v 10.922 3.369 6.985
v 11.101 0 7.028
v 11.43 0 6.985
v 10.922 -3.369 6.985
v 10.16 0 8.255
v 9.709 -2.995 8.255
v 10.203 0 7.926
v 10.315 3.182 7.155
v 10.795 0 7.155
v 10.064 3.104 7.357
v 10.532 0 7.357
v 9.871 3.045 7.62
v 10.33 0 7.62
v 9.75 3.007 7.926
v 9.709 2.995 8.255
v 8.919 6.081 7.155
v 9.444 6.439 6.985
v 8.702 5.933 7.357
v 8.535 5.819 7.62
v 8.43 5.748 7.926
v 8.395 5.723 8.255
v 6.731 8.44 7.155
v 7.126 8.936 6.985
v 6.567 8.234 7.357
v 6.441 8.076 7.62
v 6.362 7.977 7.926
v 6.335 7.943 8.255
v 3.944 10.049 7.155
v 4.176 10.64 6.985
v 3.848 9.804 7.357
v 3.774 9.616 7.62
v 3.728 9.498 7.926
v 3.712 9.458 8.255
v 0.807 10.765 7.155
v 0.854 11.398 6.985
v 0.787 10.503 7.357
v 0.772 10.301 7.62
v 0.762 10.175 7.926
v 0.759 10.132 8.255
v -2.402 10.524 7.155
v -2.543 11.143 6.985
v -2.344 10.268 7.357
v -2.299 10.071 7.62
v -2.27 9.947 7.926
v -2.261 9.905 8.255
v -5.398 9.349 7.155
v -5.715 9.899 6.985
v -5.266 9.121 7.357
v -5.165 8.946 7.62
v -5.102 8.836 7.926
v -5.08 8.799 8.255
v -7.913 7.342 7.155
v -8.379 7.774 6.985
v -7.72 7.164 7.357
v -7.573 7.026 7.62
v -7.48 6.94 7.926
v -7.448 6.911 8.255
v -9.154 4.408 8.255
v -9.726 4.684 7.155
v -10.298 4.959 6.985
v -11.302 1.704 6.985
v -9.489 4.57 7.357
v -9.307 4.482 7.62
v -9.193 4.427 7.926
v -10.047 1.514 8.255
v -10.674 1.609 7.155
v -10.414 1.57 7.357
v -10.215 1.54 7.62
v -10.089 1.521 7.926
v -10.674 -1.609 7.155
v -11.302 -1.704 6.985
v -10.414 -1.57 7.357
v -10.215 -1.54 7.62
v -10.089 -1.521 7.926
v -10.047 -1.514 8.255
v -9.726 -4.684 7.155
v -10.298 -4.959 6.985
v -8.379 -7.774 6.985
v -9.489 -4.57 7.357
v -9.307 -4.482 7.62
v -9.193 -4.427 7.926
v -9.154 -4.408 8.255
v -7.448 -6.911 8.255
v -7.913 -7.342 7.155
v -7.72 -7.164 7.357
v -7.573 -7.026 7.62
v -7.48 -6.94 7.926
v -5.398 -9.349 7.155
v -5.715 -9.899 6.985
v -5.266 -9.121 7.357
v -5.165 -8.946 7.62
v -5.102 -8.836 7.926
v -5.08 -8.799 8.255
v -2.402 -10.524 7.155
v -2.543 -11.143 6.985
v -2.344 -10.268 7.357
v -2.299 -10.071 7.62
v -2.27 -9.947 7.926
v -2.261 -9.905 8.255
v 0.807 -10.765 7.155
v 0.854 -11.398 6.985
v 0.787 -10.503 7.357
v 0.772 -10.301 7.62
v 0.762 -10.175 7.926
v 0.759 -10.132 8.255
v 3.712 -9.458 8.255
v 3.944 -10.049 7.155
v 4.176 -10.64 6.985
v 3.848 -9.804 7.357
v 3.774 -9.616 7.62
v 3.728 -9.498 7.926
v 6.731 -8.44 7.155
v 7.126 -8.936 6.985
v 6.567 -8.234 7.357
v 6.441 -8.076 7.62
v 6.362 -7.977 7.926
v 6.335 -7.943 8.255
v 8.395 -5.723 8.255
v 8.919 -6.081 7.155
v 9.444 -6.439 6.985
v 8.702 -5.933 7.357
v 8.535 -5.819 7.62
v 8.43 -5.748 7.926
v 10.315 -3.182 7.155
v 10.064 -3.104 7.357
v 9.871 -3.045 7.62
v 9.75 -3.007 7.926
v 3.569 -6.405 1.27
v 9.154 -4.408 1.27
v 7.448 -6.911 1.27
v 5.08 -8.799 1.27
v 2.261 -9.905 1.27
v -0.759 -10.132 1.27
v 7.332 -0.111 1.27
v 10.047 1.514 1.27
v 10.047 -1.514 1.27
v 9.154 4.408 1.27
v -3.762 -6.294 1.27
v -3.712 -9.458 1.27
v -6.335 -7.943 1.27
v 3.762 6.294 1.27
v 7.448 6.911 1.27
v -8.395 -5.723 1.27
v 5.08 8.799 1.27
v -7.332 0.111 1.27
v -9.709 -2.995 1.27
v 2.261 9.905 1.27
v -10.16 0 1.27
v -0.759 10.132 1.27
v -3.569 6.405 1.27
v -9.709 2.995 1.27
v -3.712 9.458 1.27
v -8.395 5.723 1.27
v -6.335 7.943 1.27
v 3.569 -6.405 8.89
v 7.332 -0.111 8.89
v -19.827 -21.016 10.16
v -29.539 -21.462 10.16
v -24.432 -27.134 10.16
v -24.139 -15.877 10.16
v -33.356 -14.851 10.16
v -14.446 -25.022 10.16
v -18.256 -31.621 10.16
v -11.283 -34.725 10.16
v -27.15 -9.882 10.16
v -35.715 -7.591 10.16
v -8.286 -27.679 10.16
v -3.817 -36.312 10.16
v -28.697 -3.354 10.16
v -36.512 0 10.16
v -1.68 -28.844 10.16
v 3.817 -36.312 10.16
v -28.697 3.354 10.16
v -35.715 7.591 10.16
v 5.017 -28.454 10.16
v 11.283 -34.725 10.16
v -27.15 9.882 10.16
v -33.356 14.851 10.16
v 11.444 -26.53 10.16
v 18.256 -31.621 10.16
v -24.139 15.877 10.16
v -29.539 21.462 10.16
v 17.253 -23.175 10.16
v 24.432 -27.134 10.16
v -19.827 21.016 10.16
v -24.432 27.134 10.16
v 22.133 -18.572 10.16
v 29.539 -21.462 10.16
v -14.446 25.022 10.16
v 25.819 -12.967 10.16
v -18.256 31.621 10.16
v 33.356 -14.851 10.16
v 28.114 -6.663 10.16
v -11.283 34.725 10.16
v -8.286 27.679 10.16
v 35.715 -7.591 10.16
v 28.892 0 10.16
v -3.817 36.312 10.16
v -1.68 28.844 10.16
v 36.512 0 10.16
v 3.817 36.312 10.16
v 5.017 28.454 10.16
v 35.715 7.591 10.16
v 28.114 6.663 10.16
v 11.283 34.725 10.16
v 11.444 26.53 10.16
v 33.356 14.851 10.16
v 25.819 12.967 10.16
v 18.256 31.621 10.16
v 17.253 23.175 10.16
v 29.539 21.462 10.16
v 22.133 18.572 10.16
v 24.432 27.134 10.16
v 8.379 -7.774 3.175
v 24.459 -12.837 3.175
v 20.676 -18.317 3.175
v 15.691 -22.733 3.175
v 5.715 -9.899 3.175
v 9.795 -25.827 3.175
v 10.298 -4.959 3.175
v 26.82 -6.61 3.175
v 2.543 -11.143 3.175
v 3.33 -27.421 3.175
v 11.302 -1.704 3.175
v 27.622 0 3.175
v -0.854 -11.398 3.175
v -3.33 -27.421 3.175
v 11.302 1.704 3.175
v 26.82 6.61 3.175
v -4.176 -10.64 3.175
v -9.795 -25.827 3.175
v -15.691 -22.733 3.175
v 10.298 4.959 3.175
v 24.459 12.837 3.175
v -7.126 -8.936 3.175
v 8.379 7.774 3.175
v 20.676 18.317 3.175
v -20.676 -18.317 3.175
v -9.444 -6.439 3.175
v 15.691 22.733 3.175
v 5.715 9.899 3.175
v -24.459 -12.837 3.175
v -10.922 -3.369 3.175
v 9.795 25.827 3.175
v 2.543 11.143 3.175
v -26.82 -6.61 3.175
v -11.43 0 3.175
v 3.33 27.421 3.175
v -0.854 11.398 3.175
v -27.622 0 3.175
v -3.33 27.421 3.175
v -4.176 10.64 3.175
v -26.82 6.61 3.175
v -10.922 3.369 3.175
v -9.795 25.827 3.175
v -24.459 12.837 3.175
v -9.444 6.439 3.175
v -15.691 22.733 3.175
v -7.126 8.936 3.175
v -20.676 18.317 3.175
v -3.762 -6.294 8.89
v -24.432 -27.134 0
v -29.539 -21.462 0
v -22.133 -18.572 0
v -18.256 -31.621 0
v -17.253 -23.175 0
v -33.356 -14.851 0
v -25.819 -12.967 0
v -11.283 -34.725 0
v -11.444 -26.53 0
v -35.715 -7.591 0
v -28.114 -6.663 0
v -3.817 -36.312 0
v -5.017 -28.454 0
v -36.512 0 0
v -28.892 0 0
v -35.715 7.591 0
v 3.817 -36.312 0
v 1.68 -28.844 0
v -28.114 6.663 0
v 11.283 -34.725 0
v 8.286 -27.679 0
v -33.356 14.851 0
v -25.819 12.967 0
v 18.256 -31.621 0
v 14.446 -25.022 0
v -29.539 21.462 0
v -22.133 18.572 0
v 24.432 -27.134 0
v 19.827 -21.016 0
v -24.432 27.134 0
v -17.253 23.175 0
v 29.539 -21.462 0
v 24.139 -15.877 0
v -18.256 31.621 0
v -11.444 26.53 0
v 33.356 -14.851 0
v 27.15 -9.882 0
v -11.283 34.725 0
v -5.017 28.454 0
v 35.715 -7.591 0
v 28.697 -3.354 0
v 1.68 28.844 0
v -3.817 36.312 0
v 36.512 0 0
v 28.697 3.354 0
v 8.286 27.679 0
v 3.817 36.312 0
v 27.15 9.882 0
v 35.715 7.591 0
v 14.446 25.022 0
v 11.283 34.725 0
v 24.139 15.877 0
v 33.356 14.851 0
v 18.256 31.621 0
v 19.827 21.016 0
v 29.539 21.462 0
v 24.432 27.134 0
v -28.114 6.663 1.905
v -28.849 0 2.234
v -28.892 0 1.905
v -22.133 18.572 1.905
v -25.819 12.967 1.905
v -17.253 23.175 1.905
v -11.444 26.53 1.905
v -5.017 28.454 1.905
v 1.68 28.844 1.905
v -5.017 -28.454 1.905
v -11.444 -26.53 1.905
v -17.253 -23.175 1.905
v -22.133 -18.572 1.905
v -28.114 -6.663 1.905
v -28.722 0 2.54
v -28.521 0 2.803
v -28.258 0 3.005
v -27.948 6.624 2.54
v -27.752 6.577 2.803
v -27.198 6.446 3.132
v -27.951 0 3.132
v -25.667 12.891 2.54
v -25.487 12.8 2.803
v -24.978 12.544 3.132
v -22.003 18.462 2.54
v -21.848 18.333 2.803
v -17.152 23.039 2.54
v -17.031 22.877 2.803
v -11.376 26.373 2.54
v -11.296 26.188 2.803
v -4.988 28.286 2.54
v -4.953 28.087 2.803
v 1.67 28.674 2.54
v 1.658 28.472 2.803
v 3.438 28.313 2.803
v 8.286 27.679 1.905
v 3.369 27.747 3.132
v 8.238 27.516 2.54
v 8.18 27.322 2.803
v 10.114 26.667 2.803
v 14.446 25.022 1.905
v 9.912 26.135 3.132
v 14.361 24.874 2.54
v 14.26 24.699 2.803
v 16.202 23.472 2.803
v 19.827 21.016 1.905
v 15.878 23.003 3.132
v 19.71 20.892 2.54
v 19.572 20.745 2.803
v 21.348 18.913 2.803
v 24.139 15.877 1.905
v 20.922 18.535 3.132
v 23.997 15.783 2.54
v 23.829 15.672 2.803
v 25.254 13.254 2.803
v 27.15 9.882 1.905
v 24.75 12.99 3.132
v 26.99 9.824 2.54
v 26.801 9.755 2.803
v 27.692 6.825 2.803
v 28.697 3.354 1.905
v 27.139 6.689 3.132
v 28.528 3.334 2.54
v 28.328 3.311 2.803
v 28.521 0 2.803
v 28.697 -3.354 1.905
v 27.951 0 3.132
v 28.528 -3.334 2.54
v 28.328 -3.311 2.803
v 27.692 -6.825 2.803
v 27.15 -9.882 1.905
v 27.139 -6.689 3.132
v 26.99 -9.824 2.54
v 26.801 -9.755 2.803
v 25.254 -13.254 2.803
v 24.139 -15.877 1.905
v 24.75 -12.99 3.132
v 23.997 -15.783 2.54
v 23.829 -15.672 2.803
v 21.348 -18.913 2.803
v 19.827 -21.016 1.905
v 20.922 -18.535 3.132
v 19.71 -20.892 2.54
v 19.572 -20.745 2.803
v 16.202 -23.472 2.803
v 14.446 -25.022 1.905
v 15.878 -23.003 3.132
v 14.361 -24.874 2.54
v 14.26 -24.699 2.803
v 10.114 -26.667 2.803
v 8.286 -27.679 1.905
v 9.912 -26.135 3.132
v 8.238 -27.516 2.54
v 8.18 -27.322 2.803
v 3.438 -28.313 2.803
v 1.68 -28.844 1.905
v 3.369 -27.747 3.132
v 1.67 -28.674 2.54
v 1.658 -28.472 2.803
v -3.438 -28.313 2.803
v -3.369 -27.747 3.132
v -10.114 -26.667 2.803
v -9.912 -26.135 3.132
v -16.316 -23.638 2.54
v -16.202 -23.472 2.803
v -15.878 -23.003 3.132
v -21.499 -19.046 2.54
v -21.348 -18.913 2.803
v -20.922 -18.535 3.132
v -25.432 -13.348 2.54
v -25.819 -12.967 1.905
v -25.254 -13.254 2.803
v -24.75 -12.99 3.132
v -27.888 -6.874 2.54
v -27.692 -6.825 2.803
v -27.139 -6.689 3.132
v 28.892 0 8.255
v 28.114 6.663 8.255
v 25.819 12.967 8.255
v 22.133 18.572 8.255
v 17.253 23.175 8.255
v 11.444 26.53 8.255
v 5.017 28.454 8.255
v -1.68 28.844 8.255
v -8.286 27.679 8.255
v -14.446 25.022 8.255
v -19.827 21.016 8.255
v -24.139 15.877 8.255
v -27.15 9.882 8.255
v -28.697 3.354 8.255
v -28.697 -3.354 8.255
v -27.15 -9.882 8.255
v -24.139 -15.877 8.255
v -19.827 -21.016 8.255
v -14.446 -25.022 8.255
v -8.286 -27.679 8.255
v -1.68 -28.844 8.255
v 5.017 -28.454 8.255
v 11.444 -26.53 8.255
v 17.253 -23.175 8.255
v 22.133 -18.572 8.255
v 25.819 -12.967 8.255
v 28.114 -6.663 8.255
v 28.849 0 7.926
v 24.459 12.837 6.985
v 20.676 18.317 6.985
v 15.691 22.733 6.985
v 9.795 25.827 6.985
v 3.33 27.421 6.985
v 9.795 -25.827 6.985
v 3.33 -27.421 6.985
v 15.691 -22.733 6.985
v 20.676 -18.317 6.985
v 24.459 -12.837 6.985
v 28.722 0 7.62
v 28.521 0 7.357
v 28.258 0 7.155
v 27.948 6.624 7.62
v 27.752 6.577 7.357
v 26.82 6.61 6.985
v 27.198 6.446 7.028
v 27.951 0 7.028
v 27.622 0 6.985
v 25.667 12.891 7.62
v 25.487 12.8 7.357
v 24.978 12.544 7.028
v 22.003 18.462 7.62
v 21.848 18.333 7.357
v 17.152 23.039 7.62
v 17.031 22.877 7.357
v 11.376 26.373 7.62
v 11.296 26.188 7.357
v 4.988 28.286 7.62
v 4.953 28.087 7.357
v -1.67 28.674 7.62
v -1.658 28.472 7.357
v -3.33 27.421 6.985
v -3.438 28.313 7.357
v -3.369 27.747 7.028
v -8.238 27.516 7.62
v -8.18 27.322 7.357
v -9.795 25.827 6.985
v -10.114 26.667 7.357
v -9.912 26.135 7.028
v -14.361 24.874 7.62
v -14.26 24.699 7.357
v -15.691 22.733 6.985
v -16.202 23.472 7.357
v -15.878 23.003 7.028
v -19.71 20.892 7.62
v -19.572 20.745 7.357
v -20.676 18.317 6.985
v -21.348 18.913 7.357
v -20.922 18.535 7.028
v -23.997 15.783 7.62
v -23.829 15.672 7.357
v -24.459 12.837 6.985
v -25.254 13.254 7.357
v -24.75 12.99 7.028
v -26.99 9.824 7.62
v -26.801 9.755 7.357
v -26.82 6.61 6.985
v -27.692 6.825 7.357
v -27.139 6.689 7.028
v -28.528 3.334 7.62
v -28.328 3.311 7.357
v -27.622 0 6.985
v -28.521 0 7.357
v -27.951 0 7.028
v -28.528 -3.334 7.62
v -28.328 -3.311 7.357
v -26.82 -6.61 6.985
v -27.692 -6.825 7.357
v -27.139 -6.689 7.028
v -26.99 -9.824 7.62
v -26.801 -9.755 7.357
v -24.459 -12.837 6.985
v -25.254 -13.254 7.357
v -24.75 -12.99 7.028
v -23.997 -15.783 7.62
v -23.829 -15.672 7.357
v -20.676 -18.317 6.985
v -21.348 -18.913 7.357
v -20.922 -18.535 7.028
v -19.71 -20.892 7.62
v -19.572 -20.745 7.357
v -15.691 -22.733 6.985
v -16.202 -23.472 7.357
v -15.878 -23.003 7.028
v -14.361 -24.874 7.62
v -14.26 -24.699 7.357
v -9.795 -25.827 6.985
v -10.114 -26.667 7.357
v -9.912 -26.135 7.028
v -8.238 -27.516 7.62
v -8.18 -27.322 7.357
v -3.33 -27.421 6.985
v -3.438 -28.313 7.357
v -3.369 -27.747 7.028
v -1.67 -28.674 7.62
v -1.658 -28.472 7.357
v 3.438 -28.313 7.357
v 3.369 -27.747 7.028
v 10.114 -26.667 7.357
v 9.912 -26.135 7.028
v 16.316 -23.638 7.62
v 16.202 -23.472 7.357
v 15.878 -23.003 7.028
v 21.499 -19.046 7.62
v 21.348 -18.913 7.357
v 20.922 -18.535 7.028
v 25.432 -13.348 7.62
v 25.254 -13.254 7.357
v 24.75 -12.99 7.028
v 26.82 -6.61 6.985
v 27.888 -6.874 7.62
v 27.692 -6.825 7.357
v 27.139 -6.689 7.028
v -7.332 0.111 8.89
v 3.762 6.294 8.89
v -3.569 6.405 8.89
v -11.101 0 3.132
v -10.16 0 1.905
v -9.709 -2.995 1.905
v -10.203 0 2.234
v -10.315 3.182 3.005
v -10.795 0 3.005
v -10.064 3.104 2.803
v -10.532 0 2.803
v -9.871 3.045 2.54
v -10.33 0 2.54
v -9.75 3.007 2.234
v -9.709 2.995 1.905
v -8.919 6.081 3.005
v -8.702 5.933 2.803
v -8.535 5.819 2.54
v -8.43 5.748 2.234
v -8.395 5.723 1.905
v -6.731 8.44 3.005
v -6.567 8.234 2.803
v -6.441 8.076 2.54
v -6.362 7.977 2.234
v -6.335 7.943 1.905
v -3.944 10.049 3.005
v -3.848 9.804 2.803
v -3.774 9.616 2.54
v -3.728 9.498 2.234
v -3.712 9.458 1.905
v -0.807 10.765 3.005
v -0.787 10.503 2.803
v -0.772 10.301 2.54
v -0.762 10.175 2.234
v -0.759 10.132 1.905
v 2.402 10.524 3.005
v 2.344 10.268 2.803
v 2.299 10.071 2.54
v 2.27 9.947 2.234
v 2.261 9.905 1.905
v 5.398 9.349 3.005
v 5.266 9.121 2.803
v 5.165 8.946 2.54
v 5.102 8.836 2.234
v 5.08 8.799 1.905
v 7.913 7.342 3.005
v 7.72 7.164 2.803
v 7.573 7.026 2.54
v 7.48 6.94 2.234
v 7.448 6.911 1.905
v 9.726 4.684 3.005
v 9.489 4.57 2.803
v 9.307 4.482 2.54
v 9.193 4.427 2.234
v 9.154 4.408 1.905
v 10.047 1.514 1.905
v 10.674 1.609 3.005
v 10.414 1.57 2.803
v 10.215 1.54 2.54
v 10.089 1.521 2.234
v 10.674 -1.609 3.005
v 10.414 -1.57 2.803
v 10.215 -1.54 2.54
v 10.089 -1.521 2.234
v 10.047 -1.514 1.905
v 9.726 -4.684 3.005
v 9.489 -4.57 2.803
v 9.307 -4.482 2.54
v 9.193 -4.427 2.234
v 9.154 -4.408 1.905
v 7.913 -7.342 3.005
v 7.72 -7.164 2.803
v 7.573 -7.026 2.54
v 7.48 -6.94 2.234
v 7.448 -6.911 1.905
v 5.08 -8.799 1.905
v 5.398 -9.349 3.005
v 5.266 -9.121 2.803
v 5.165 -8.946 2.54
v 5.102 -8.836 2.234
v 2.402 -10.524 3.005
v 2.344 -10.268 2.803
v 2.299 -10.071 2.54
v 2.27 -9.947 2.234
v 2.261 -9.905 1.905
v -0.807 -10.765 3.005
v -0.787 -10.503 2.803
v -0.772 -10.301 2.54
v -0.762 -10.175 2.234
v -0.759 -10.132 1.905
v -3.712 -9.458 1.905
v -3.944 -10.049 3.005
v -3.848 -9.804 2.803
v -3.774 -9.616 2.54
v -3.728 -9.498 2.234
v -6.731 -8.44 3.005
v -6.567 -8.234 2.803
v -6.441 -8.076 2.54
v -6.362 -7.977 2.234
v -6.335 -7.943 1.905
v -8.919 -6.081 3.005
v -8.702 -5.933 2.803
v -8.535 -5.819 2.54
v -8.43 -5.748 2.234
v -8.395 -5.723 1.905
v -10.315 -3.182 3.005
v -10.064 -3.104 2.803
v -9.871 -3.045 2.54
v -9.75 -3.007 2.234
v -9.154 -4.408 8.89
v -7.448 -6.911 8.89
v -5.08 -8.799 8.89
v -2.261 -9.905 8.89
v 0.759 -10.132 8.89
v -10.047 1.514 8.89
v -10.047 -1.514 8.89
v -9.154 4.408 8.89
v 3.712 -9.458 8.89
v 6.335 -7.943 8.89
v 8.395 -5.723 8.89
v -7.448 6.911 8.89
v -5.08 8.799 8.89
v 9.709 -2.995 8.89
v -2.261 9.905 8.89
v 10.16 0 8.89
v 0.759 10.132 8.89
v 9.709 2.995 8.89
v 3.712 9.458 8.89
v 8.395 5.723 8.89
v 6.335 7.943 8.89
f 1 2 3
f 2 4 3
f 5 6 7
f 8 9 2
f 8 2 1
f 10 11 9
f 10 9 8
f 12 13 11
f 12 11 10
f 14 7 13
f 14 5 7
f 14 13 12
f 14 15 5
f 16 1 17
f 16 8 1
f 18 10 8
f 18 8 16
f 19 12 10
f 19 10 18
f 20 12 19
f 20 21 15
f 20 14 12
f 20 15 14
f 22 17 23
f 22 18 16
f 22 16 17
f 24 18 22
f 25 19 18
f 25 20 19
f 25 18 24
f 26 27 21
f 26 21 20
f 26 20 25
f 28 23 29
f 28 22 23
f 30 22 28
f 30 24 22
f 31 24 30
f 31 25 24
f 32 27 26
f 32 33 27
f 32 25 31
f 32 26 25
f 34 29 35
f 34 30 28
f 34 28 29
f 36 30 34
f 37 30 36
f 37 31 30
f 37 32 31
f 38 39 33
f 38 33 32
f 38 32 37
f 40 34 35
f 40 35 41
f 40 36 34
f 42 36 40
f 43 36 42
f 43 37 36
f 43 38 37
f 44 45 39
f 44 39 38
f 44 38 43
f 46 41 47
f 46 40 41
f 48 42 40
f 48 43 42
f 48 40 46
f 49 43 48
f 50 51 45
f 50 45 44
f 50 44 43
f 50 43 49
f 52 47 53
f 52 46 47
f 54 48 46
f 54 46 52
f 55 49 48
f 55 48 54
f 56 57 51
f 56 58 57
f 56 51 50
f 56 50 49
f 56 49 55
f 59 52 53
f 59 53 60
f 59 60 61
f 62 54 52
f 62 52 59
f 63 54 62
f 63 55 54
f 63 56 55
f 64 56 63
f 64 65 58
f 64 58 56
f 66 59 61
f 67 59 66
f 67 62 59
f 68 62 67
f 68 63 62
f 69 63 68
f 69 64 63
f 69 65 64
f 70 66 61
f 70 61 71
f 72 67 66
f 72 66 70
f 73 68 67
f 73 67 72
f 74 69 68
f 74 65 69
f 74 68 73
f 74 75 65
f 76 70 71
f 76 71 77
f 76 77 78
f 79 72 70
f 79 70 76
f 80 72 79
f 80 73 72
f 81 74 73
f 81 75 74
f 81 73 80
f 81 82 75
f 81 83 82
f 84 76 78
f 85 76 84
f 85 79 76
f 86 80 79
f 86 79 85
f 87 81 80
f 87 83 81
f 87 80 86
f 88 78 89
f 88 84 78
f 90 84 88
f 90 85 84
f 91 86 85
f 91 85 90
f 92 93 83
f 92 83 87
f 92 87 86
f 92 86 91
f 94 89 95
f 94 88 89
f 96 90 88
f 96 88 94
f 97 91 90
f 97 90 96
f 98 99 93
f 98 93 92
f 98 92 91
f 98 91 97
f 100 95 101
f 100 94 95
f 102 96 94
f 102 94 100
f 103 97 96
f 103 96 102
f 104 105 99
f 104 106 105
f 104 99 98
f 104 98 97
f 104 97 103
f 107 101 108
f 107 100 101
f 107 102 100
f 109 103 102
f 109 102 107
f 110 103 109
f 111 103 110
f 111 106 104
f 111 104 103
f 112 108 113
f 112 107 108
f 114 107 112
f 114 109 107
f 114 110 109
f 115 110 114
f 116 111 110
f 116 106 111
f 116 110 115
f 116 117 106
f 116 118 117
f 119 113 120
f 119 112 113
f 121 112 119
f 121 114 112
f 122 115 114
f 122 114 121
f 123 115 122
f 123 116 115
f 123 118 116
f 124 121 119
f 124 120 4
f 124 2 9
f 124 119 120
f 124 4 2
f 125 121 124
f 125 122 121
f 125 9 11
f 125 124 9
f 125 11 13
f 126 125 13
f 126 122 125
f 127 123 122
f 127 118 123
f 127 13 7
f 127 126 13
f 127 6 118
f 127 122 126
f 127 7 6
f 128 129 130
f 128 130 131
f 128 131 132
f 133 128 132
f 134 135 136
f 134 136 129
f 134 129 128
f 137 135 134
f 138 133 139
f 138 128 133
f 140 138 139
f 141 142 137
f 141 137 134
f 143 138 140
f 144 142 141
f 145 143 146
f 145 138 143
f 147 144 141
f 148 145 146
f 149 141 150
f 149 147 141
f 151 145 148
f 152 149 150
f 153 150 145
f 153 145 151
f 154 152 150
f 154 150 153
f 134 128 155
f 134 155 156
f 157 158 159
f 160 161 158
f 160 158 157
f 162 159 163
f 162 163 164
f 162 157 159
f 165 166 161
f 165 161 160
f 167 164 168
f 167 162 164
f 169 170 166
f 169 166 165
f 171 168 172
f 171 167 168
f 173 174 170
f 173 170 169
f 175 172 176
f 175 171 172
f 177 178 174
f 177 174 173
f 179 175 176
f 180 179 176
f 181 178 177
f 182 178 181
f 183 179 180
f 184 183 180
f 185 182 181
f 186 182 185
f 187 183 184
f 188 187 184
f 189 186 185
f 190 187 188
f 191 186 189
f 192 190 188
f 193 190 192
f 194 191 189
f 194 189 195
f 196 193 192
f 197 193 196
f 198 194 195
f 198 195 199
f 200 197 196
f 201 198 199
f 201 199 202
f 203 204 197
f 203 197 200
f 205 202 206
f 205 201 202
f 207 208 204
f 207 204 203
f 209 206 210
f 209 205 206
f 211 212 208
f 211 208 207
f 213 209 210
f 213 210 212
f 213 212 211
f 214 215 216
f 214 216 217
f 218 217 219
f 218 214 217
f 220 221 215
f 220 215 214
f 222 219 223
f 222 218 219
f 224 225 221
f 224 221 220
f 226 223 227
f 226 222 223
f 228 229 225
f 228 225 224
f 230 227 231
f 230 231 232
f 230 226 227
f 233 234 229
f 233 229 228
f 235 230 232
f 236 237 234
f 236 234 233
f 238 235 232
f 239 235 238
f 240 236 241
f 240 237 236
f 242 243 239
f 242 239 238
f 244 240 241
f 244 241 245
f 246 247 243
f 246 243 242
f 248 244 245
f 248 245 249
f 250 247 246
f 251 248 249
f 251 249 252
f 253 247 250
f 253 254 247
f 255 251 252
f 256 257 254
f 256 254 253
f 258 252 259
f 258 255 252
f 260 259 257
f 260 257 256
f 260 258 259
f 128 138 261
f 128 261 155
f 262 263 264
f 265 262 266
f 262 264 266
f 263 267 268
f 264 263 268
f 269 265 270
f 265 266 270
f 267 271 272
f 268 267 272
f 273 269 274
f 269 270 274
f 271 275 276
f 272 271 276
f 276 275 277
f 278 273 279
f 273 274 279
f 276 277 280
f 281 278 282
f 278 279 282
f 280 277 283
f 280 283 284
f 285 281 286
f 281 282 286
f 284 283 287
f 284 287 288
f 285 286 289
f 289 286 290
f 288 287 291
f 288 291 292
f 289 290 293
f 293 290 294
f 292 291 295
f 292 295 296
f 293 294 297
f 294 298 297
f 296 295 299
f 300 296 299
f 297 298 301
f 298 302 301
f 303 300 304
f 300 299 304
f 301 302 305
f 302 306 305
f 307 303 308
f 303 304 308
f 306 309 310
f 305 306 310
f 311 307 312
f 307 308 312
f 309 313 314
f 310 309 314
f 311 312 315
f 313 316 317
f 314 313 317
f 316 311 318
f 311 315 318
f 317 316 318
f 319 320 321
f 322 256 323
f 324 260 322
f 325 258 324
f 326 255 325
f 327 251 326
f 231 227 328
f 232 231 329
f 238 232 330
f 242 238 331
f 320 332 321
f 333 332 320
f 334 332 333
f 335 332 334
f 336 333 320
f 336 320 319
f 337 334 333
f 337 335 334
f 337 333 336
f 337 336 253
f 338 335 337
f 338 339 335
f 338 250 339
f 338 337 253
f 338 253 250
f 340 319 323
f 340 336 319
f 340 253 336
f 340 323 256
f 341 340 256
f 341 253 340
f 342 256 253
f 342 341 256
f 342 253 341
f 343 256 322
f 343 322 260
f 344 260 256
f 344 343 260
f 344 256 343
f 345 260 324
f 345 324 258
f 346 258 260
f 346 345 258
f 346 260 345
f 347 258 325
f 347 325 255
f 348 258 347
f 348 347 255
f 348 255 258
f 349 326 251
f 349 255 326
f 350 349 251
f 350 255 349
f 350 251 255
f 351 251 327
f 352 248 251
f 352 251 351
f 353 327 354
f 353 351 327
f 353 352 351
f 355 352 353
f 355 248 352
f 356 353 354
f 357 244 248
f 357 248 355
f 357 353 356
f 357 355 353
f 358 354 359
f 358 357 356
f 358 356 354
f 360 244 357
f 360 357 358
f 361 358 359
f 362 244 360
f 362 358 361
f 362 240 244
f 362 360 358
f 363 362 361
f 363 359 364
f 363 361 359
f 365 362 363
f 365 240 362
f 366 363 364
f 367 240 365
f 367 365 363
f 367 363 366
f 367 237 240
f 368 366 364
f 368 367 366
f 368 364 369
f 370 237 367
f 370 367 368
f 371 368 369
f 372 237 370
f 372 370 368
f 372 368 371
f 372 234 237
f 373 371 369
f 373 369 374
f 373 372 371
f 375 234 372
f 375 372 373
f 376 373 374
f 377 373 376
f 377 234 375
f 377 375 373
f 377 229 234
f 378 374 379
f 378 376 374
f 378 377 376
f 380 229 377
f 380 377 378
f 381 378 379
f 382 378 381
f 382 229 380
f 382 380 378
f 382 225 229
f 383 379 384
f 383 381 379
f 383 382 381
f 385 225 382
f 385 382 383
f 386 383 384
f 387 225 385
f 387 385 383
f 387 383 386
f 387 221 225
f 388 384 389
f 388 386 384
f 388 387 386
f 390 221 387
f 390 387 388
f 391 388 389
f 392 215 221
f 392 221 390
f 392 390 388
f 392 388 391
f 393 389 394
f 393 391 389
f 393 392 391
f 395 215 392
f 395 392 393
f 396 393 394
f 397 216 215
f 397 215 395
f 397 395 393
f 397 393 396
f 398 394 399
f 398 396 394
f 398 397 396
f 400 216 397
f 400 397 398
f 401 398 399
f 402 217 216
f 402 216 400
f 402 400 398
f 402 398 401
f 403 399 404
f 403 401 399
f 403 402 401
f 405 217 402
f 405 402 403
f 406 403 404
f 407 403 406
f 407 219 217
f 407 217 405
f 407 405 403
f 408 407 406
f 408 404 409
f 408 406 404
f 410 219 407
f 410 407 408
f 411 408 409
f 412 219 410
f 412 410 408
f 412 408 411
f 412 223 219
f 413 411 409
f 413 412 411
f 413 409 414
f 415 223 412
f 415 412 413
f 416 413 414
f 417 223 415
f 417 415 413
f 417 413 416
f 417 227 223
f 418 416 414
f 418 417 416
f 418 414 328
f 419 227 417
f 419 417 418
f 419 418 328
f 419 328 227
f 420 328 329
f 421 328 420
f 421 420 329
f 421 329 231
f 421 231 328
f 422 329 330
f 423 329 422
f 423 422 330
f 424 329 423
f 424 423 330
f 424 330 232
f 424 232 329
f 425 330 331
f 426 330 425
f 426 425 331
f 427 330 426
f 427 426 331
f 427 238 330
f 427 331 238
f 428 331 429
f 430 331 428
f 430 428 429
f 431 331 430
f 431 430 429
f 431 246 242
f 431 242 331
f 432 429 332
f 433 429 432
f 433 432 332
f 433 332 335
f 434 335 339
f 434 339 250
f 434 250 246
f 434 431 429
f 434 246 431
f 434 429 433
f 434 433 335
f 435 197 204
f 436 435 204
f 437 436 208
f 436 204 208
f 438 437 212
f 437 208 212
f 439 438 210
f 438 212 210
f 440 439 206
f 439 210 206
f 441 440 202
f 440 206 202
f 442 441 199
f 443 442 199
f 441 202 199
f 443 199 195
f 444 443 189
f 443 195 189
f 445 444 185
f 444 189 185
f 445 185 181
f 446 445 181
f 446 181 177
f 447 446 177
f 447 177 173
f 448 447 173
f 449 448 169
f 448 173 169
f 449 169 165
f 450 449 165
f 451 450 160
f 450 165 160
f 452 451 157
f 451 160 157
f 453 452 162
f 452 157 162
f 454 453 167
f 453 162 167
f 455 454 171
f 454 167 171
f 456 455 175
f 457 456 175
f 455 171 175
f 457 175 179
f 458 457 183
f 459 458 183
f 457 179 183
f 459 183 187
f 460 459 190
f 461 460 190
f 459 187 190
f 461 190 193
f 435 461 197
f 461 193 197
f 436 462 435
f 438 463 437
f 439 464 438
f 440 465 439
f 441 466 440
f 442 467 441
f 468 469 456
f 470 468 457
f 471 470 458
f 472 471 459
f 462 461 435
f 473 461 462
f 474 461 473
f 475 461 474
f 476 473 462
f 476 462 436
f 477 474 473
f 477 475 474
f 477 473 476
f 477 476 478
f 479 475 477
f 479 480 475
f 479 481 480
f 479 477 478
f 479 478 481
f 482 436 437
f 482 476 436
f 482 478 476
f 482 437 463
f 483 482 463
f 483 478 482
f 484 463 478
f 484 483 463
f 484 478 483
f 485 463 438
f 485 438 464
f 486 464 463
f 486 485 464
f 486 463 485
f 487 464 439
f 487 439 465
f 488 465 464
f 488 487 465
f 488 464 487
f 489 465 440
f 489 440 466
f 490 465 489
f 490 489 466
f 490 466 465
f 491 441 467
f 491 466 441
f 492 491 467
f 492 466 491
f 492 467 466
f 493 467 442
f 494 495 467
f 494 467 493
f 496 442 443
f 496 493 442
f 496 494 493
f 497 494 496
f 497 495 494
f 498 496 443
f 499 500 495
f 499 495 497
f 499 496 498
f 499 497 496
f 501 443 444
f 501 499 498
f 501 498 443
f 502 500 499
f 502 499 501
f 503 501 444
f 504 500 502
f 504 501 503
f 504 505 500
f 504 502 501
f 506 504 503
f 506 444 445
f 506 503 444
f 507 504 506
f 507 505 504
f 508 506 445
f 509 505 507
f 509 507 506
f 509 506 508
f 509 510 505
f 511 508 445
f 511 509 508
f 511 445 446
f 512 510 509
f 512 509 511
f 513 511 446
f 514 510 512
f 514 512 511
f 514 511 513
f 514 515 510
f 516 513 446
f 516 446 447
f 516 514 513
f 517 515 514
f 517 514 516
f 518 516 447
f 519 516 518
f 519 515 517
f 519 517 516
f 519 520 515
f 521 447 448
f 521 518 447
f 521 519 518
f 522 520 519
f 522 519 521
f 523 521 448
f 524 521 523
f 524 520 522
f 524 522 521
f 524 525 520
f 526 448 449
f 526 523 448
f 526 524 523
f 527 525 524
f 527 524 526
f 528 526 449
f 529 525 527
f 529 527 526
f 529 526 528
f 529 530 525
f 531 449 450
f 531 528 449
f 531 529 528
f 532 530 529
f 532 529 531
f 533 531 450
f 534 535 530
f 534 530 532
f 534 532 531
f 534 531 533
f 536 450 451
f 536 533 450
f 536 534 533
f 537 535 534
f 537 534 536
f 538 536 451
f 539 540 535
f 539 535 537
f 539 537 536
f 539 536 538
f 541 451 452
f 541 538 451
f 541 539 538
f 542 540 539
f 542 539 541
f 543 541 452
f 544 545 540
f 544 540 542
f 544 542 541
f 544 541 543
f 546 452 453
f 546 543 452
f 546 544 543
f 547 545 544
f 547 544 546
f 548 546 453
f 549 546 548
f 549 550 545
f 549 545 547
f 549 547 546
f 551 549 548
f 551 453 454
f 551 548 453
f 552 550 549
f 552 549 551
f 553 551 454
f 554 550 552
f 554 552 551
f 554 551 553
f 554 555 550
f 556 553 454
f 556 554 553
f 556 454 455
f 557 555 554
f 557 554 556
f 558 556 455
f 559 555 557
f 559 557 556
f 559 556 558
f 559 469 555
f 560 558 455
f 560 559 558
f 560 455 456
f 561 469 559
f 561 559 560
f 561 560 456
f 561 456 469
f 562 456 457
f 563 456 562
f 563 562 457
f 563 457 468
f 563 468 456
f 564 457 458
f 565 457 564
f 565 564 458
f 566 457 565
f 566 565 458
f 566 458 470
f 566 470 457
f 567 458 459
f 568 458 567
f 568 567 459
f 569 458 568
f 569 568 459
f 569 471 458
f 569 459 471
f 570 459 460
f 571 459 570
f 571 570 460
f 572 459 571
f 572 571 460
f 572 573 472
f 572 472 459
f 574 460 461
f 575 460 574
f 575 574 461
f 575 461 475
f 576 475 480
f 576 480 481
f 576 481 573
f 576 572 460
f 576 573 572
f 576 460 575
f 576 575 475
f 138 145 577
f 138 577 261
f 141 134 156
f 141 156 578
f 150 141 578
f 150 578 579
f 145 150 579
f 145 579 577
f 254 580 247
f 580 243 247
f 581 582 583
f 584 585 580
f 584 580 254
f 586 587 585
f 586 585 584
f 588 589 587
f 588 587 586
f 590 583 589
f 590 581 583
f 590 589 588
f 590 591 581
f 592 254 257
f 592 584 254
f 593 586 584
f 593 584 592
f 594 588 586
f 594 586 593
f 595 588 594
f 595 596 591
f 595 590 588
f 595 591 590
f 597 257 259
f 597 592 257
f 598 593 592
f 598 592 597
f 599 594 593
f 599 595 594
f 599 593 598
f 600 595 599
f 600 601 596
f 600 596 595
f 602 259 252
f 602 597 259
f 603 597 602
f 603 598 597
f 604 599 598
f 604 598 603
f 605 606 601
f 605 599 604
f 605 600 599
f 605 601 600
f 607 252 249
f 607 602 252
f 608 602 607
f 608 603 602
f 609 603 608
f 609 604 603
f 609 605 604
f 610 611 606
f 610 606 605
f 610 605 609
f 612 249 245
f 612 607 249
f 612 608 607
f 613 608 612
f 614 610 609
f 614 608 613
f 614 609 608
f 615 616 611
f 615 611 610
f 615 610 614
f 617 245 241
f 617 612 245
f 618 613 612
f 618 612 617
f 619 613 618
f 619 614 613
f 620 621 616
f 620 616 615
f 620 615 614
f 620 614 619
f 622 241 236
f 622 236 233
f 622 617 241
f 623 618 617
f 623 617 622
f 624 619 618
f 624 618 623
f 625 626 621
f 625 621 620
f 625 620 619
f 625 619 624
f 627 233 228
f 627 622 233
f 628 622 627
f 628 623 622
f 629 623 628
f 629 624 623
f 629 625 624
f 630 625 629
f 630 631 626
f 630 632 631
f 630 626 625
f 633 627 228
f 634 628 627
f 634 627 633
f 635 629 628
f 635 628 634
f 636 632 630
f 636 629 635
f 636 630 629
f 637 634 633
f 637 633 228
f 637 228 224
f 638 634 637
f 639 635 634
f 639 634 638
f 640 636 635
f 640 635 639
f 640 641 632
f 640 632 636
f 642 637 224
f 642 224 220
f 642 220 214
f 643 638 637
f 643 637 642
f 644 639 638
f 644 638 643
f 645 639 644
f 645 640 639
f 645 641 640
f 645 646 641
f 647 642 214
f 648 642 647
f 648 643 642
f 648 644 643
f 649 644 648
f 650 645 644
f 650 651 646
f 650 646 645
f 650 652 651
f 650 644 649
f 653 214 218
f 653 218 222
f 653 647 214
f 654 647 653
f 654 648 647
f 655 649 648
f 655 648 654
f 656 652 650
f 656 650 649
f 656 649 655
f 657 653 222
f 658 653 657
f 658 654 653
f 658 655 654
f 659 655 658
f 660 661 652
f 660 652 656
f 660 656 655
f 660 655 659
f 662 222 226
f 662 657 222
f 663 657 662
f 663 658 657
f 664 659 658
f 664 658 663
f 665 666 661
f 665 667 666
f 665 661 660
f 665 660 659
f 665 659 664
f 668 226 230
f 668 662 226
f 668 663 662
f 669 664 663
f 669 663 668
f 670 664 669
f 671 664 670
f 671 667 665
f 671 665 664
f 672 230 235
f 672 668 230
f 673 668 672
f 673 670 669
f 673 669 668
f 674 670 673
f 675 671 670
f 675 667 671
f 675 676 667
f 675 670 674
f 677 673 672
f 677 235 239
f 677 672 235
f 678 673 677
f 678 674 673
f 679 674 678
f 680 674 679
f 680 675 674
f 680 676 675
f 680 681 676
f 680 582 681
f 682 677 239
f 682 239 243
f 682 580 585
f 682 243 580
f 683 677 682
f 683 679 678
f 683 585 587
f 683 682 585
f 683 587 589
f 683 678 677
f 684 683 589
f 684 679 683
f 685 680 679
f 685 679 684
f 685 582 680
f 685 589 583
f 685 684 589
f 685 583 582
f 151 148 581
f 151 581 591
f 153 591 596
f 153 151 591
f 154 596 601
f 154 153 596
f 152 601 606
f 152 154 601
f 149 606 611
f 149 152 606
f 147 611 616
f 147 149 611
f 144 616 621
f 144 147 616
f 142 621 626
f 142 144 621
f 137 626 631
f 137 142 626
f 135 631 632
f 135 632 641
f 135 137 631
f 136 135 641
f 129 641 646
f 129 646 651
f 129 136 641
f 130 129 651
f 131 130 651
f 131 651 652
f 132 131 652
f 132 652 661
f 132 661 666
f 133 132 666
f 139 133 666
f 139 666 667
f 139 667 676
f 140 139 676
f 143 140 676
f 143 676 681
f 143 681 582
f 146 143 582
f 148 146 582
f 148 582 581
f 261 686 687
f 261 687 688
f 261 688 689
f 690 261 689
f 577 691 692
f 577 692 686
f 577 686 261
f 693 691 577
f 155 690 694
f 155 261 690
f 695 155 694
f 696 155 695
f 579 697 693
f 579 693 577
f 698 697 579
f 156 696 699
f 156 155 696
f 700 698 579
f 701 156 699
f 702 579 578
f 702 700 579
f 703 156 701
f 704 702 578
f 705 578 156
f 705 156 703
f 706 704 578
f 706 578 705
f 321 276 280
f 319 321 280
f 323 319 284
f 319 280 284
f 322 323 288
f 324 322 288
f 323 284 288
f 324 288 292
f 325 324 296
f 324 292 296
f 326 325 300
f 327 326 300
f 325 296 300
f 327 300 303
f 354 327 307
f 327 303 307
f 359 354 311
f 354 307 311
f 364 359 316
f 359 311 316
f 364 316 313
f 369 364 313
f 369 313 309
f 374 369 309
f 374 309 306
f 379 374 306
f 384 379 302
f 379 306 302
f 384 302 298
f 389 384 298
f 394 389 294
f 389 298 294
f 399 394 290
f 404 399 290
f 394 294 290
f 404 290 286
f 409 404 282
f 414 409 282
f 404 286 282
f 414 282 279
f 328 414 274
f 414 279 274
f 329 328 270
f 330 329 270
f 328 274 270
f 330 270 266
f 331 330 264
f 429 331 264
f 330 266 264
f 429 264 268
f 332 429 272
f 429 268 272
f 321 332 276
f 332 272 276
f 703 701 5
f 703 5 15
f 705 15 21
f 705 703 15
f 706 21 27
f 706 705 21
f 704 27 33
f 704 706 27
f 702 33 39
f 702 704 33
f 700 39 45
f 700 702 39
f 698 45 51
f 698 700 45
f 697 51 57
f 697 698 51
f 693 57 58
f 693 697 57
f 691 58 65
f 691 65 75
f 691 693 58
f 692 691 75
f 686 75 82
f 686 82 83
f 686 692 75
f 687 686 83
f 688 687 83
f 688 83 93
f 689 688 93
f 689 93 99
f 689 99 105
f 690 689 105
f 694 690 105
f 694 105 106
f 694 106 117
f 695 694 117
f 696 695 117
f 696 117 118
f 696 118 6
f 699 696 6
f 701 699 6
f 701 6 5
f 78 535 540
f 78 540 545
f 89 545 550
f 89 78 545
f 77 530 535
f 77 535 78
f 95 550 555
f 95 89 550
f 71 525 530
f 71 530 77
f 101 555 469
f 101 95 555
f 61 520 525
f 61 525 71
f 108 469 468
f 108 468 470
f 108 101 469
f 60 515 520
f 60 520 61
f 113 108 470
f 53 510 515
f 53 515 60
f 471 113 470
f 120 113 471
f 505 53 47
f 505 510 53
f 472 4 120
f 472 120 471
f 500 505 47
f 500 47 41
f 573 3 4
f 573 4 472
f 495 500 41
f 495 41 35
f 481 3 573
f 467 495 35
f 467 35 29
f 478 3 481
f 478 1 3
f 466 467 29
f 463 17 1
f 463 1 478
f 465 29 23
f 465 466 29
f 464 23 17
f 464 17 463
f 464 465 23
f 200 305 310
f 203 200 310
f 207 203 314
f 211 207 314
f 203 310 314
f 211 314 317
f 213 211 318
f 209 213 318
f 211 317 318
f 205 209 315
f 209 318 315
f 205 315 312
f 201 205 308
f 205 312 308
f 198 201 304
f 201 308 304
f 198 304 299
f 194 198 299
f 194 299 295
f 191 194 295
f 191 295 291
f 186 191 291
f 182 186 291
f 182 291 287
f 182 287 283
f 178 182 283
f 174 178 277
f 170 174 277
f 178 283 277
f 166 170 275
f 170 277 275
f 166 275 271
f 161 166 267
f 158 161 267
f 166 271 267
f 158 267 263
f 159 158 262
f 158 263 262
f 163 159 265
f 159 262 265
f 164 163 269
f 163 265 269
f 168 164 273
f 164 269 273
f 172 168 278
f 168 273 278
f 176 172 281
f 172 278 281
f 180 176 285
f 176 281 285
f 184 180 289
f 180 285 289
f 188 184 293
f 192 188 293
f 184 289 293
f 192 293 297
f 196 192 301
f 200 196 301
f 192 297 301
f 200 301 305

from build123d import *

# Parameters (mm, degrees)
SKETCH1_R           = 36.5125
BOSS_EXTRUDE1_DEPTH = 10.16
SKETCH2_R           = 28.8925
SKETCH2_R_2         = 10.16
CUT_EXTRUDE1_DEPTH  = 3.175
SKETCH3_R           = 28.8925
SKETCH3_R_2         = 10.16
CUT_EXTRUDE2_DEPTH  = 3.175
SKETCH4_R           = 10.16
CUT_EXTRUDE3_DEPTH  = 1.27
SKETCH7_R           = 10.16
CUT_EXTRUDE5_DEPTH  = 1.27
FILLET1_R           = 1.27


with BuildPart() as part:
    # Sketch1 → Boss-Extrude1 (new body)
    with BuildSketch(Plane.XY):
        Circle(SKETCH1_R)
        Polygon((3.569234353, -6.4049902), (7.331501401, -0.111447478), (3.762267048, 6.293542722), (-3.569234353, 6.4049902), (-7.331501401, 0.111447478), (-3.762267048, -6.293542722), align=None, mode=Mode.SUBTRACT)
    extrude(amount=BOSS_EXTRUDE1_DEPTH)

    # Sketch2 → Cut-Extrude1 (cut)
    with BuildSketch(Plane.XY.offset(10.16)):
        Circle(SKETCH2_R)
        Circle(SKETCH2_R_2, mode=Mode.SUBTRACT)
    extrude(amount=-CUT_EXTRUDE1_DEPTH, mode=Mode.SUBTRACT)

    # Sketch3 → Cut-Extrude2 (cut)
    with BuildSketch(Plane(origin=(0, 0, 0), x_dir=(-1, 0, 0), z_dir=(0, 0, -1))):
        Circle(SKETCH3_R)
        Circle(SKETCH3_R_2, mode=Mode.SUBTRACT)
    extrude(amount=-CUT_EXTRUDE2_DEPTH, mode=Mode.SUBTRACT)

    # Sketch4 → Cut-Extrude3 (cut)
    with BuildSketch(Plane(origin=(0, 0, 0), x_dir=(-1, 0, 0), z_dir=(0, 0, -1))):
        Circle(SKETCH4_R)
    extrude(amount=-CUT_EXTRUDE3_DEPTH, mode=Mode.SUBTRACT)

    # Sketch7 → Cut-Extrude5 (cut)
    with BuildSketch(Plane.XY.offset(10.16)):
        Circle(SKETCH7_R)
    extrude(amount=-CUT_EXTRUDE5_DEPTH, mode=Mode.SUBTRACT)

    # Fillet1
    fillet1_edges = [part.edges().sort_by_distance(p)[0] for p in [
        (-28.8925, 0, 6.985),
        (-10.16, 0, 6.985),
        (28.8925, 0, 3.175),
        (10.16, 0, 3.175),
    ]]
    fillet(fillet1_edges, radius=FILLET1_R)


solid = part.part
